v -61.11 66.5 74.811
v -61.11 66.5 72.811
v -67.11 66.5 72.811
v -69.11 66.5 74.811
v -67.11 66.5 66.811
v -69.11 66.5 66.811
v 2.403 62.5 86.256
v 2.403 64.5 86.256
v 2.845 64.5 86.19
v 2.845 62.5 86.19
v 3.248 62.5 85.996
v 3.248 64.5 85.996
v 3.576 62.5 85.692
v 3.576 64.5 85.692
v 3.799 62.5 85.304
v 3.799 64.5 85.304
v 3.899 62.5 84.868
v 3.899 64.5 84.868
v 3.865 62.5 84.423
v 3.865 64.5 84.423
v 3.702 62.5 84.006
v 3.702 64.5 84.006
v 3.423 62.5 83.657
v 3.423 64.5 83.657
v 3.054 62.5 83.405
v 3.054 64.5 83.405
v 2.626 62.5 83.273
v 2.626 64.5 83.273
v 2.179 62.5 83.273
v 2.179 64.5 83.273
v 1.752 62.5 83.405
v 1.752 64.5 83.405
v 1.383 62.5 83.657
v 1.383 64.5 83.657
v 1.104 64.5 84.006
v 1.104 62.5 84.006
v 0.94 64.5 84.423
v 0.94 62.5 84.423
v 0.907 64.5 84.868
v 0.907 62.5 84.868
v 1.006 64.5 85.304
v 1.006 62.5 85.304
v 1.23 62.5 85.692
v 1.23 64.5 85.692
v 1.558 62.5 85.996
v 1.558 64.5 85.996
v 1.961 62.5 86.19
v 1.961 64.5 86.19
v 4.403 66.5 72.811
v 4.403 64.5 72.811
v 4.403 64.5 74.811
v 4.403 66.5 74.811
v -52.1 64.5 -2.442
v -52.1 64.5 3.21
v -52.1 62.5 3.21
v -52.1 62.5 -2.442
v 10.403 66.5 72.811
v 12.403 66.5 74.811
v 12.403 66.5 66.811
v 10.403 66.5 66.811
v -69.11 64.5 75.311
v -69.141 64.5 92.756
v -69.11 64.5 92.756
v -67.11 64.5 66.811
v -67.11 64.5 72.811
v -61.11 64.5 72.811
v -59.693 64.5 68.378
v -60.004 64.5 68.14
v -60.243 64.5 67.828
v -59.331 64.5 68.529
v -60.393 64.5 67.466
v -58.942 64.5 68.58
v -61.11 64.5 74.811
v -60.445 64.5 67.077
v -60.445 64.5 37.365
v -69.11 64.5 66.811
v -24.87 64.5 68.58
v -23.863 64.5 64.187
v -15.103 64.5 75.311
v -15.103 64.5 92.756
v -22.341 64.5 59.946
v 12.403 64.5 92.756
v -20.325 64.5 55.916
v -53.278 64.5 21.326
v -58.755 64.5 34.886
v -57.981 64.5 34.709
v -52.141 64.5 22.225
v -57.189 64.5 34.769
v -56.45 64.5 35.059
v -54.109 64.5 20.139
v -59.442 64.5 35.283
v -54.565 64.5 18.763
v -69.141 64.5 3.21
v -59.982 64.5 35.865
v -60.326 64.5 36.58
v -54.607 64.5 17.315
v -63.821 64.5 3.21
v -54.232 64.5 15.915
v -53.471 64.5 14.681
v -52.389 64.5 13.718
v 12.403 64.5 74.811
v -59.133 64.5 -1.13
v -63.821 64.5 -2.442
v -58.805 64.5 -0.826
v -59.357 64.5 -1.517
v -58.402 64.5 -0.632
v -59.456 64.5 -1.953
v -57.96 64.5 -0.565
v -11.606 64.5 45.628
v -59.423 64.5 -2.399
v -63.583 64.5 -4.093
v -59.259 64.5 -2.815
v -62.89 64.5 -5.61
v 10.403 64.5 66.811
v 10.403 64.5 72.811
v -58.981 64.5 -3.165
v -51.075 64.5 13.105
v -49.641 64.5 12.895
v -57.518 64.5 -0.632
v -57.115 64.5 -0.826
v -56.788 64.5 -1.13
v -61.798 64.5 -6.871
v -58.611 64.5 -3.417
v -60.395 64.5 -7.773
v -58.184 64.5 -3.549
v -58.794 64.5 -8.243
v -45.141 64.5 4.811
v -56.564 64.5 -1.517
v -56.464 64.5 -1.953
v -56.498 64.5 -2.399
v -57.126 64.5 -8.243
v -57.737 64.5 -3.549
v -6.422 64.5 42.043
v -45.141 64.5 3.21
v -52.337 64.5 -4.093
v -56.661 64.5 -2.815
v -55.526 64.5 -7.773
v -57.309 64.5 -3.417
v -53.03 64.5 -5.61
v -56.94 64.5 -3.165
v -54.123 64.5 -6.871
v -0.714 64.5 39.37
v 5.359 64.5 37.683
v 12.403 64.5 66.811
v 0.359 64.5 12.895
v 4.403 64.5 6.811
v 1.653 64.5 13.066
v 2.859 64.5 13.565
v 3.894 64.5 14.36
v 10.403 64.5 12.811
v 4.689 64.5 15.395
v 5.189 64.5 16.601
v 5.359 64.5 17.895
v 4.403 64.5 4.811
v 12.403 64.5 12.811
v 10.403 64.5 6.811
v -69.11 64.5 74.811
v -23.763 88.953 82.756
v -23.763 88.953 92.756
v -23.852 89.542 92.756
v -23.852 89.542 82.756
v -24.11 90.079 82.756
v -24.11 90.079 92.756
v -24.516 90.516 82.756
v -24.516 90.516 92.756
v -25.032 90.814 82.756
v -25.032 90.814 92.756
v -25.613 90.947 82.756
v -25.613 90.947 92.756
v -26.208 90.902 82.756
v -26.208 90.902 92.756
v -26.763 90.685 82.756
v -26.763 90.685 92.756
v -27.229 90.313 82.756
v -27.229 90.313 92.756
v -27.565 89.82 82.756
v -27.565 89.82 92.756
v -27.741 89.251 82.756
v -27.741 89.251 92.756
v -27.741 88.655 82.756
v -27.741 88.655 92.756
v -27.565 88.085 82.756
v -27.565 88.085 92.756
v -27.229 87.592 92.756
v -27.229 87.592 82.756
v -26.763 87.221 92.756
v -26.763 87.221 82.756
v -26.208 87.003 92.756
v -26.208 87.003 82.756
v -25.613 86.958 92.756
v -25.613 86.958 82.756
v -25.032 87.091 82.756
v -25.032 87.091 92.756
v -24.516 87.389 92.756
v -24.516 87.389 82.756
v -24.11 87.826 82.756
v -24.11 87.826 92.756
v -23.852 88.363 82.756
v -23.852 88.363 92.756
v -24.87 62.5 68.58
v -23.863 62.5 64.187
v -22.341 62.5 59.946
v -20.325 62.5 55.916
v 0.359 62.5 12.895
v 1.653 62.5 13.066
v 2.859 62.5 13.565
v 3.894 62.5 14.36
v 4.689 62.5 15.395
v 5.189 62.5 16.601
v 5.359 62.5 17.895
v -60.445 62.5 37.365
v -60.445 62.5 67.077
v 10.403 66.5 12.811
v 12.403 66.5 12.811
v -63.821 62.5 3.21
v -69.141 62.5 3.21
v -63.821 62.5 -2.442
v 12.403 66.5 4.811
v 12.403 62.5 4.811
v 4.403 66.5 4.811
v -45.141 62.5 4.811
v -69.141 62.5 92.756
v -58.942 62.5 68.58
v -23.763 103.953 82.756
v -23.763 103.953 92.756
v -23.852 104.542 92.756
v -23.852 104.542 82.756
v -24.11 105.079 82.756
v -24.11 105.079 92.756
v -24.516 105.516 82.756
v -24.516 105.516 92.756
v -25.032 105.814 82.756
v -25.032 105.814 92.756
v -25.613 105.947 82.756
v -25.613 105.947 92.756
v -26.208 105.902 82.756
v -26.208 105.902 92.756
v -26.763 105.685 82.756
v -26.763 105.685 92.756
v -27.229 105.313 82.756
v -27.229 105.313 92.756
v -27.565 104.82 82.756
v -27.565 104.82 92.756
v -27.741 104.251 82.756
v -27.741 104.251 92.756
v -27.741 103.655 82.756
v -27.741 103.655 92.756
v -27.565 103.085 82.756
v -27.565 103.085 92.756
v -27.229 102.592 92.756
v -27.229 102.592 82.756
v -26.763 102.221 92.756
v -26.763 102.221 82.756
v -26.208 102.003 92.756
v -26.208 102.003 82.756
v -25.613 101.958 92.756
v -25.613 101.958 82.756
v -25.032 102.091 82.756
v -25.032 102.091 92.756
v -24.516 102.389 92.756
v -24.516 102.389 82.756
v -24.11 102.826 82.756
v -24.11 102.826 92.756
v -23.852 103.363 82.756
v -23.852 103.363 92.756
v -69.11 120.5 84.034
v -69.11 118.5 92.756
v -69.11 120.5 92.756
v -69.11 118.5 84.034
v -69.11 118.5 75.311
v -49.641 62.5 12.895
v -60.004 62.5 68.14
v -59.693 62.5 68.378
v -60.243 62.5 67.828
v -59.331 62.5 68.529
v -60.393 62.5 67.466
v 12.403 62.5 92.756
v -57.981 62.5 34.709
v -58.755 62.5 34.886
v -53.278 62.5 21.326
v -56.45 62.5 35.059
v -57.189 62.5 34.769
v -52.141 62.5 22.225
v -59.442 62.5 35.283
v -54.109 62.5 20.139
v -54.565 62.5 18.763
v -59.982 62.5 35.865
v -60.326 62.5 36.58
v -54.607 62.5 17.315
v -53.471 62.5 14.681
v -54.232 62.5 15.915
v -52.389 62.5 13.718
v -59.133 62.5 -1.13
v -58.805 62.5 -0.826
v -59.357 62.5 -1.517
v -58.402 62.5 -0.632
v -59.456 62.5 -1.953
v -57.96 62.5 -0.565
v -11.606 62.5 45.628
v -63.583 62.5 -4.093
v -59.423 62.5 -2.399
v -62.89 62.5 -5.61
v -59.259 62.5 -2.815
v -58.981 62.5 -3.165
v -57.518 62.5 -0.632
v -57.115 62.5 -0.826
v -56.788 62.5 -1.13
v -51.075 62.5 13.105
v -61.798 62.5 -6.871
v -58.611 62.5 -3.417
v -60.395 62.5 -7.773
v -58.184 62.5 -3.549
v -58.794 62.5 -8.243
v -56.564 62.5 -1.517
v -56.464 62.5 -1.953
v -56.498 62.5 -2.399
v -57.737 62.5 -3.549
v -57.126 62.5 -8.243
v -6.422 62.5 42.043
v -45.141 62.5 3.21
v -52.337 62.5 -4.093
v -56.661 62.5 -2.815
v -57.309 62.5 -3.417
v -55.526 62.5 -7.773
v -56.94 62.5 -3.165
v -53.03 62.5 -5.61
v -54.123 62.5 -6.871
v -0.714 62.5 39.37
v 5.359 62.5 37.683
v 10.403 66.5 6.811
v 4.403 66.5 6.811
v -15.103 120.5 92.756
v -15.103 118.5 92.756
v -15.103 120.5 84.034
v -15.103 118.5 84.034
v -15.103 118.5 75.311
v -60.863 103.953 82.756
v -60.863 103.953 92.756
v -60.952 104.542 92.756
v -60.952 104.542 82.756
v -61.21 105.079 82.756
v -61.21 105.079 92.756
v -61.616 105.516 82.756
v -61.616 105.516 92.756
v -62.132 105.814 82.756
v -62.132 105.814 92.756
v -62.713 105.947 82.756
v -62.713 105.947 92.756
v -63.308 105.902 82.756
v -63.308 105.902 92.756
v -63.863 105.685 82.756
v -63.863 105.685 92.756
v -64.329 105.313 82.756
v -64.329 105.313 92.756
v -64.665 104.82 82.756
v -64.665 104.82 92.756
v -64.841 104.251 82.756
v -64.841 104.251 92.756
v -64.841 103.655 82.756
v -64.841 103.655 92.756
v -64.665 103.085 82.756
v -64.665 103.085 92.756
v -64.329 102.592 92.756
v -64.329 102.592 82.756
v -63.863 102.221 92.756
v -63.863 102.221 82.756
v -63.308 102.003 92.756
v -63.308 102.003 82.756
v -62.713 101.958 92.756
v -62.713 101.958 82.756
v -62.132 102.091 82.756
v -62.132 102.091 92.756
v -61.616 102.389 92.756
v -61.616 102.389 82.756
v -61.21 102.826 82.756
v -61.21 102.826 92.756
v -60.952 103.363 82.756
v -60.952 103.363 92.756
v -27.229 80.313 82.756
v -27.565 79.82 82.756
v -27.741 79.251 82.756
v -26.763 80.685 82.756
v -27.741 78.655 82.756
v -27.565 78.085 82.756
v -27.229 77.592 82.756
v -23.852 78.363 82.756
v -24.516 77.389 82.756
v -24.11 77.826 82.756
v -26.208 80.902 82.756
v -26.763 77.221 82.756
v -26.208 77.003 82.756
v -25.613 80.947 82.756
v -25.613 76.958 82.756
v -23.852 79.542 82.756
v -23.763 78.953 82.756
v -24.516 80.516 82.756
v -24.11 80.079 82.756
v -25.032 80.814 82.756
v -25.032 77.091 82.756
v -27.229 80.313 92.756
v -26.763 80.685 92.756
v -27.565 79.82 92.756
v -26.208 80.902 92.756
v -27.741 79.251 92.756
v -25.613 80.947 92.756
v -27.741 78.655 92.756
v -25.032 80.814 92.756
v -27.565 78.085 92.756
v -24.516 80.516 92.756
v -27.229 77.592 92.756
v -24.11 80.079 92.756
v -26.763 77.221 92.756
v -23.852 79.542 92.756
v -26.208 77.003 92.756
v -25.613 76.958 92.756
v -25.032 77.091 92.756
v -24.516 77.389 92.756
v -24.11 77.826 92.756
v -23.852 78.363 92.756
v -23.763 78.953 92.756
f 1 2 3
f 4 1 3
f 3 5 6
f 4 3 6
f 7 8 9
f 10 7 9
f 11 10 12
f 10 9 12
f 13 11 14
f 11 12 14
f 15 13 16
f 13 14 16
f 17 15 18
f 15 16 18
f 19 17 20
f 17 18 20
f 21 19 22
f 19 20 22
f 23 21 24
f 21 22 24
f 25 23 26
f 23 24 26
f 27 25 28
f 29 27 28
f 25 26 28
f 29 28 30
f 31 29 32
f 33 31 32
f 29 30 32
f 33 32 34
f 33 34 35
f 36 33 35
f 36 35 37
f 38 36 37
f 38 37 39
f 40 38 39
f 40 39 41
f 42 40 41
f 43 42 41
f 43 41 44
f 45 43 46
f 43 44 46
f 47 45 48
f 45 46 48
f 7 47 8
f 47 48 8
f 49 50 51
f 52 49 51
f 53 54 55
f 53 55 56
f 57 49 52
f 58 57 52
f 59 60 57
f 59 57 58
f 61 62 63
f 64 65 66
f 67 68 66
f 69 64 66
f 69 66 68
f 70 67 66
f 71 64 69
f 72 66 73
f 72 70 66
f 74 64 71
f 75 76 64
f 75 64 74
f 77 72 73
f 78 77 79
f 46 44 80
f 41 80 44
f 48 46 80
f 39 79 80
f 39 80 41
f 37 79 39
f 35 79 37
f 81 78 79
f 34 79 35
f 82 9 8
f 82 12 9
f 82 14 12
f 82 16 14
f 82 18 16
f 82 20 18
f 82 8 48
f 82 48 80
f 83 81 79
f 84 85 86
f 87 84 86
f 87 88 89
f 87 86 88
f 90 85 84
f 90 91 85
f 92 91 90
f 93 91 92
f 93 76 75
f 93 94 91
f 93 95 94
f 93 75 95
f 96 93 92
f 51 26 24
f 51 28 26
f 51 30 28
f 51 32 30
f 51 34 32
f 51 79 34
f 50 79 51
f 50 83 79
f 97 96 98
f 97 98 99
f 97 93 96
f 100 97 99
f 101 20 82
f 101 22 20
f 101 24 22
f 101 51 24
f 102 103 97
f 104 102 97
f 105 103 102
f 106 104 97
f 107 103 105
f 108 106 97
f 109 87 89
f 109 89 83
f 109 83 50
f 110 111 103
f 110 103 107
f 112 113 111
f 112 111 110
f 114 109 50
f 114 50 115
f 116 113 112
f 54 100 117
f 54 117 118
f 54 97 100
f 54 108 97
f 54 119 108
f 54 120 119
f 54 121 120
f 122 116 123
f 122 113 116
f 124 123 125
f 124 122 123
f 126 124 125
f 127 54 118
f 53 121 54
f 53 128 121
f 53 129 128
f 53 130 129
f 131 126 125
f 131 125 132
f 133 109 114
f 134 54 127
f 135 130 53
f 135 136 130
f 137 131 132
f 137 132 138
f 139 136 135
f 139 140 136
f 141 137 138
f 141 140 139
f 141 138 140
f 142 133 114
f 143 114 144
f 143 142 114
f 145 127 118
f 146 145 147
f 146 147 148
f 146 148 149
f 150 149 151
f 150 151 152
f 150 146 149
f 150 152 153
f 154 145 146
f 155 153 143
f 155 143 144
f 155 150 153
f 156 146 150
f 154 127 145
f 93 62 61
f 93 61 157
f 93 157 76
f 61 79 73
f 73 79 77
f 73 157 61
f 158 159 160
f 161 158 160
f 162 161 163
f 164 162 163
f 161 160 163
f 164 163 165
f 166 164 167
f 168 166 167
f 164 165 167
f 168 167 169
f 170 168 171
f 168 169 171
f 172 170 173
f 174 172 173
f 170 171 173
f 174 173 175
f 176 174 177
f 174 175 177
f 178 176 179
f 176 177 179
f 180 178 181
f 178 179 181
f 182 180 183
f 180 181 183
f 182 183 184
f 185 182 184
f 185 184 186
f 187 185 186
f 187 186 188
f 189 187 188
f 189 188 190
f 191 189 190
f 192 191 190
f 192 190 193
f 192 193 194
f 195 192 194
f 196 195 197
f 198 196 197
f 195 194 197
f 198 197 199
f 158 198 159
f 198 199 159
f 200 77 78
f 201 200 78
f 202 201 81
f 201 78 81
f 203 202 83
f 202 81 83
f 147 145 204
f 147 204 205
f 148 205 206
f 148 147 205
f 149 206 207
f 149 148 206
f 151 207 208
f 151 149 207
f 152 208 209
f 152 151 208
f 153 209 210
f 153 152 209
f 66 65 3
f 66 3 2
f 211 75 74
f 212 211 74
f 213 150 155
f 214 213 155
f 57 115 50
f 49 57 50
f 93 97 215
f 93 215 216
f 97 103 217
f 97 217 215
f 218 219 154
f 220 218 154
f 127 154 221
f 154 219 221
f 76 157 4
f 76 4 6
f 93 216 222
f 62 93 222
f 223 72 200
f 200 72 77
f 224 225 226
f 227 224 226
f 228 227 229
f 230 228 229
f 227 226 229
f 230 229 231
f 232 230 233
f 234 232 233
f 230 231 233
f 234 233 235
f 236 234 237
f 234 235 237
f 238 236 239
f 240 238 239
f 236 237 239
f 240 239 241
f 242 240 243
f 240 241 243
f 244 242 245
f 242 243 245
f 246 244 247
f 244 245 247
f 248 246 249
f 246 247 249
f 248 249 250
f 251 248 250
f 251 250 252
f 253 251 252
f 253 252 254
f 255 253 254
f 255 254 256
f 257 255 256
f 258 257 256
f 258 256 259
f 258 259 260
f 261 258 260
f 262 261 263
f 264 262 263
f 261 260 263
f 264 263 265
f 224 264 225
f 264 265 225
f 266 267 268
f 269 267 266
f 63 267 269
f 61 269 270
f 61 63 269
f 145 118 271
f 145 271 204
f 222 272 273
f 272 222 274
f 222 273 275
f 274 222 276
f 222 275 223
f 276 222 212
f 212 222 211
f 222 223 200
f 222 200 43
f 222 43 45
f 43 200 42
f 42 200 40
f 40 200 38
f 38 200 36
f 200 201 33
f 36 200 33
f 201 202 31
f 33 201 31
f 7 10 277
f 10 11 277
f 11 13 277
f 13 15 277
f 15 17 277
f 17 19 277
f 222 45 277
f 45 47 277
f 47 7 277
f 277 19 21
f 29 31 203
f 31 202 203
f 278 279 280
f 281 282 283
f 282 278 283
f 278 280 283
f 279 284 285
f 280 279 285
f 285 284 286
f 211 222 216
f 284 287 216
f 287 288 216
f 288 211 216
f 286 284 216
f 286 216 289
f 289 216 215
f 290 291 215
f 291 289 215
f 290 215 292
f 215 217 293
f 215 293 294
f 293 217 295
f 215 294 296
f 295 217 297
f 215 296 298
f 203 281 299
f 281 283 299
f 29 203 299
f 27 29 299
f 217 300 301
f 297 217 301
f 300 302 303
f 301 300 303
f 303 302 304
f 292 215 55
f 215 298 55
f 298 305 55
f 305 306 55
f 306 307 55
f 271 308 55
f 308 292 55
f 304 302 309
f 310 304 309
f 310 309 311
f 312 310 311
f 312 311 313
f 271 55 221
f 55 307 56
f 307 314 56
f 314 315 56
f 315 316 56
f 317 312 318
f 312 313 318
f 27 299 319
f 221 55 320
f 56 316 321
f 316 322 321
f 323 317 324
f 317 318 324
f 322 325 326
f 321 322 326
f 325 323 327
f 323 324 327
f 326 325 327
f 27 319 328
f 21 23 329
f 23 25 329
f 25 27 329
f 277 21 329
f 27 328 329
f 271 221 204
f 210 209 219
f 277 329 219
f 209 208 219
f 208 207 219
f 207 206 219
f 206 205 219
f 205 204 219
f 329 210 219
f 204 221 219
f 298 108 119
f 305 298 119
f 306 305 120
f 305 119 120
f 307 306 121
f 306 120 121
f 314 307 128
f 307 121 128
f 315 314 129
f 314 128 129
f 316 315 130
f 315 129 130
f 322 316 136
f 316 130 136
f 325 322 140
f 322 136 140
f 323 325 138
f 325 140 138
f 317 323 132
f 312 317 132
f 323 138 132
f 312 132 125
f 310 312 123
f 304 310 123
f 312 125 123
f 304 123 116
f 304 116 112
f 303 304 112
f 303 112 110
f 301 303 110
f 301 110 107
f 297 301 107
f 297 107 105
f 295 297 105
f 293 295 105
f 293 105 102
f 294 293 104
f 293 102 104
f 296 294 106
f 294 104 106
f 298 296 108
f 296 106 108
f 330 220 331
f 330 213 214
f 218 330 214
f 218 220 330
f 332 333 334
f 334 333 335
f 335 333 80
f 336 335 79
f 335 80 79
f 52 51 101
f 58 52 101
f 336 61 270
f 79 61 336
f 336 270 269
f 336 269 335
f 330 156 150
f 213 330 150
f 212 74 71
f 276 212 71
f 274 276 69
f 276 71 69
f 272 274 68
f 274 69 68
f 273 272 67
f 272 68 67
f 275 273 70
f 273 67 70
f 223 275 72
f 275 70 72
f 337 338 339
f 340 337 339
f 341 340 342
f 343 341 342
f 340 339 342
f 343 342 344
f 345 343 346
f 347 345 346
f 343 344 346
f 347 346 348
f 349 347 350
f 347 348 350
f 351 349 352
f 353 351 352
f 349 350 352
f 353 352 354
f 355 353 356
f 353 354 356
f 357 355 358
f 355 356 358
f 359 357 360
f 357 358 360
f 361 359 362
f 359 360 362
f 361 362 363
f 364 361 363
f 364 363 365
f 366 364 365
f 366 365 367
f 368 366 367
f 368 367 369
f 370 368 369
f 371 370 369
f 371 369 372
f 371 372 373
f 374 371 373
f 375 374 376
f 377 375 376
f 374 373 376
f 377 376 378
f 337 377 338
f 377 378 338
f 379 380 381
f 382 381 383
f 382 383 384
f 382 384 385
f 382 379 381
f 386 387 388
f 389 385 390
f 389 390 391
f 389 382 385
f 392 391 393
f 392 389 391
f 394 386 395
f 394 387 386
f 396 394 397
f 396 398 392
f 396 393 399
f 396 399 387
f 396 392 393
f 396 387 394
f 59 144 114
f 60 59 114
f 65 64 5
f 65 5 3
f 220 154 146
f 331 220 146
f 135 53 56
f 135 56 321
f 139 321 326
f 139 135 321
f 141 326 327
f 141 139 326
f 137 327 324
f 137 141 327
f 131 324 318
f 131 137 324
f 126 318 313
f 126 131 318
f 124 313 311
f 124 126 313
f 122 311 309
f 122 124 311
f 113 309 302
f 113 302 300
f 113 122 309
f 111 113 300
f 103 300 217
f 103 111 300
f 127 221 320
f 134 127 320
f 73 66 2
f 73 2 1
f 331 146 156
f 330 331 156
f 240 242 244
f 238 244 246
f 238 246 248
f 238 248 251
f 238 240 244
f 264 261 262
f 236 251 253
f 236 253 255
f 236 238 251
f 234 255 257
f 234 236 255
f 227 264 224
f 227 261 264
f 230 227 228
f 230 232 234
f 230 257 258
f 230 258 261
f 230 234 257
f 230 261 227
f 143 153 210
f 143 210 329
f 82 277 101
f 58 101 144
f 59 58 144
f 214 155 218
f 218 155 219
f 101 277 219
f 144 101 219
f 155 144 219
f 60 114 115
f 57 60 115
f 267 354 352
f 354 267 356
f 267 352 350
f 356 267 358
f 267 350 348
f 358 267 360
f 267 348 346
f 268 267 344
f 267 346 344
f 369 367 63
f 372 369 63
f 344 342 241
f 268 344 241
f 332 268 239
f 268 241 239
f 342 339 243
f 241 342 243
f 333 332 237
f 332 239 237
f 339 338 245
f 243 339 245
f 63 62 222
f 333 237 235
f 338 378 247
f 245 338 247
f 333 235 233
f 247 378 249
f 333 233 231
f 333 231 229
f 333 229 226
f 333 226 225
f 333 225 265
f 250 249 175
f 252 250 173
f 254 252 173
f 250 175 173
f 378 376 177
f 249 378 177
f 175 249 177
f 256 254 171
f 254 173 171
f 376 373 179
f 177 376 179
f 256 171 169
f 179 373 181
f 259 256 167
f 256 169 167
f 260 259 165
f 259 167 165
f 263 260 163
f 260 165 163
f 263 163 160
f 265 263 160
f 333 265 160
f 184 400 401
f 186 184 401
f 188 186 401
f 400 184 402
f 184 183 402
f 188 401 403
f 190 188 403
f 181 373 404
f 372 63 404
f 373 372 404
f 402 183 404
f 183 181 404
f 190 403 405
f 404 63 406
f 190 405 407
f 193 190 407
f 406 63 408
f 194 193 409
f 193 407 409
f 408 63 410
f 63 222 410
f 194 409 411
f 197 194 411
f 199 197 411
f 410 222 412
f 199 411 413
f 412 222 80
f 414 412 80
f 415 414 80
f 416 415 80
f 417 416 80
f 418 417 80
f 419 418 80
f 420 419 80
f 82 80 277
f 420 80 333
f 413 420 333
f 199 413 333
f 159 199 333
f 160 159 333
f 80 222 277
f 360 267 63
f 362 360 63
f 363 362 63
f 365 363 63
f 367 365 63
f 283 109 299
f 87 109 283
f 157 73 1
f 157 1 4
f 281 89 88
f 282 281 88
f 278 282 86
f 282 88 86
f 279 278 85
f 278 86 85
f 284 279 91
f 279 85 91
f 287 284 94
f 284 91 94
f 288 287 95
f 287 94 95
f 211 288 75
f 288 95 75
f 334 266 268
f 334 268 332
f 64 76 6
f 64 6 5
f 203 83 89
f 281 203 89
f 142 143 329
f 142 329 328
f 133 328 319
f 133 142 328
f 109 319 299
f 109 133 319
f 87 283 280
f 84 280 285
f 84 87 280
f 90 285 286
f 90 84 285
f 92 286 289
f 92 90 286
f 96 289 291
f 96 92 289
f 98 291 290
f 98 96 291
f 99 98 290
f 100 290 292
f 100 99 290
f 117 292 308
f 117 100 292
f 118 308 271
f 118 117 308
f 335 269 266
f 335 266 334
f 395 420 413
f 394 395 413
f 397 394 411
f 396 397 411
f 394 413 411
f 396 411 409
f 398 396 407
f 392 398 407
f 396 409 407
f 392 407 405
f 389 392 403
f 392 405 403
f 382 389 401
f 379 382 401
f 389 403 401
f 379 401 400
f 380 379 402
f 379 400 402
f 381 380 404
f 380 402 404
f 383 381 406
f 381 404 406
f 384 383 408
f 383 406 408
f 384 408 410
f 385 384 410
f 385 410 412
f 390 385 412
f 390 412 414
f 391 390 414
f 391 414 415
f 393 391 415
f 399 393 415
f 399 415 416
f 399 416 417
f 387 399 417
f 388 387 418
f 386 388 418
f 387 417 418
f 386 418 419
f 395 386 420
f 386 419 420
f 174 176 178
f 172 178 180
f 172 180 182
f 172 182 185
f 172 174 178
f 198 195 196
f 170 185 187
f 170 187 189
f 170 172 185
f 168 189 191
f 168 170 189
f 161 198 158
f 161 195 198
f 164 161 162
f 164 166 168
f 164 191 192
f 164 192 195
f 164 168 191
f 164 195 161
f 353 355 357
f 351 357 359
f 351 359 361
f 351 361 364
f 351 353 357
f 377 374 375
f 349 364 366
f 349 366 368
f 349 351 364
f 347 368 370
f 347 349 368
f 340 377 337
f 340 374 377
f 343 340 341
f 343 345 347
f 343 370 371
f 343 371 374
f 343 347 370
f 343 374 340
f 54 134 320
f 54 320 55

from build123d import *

# Parameters (mm, degrees)
EXTRUDE_1_DEPTH     = 2
EXTRUDE_2_DEPTH     = 2
SKETCH_3_W          = 54.00760584
SKETCH_3_H          = 17.445111018
EXTRUDE_4_DEPTH     = 54
SKETCH_4_W          = 54.00760584
SKETCH_4_H          = 8.722555509
EXTRUDE_5_DEPTH     = 2
CUT_EXTRUDE_1_DEPTH = 2
SKETCH_6_R          = 1.5
CUT_EXTRUDE_2_DEPTH = 2
SKETCH_7_R          = 1.5
CUT_EXTRUDE_3_DEPTH = 2
SKETCH_8_R          = 2
CUT_EXTRUDE_4_DEPTH = 10
SKETCH_9_R          = 2
CUT_EXTRUDE_5_DEPTH = 10
CUT_EXTRUDE_6_DEPTH = 10


with BuildPart() as part:
    # 草图1 → 凸台-拉伸1 (new body)
    with BuildSketch(Plane(origin=(0, 62.5, 0), x_dir=(1, 0, 0), z_dir=(0, 1, 0))):
        Polygon((12.40278244, -4.811222629), (-45.141204286, -4.811222629), (-45.141204286, 44.365970357), (-69.141204286, 44.365970357), (-69.141204286, -4.811222629), (-69.141204286, -92.756333647), (12.40278244, -92.756333647), align=None)
    extrude(amount=EXTRUDE_1_DEPTH)

    # 草图2 → 凸台-拉伸2 (add)
    with BuildSketch(Plane(origin=(0, 64.5, 0), x_dir=(1, 0, 0), z_dir=(0, 1, 0))):
        Polygon((12.40278244, -4.811222629), (4.40278244, -4.811222629), (4.40278244, -6.811222629), (10.40278244, -6.811222629), (10.40278244, -12.811222629), (12.40278244, -12.811222629), align=None)
        Polygon((12.40278244, -66.811222629), (10.40278244, -66.811222629), (10.40278244, -72.811222629), (4.40278244, -72.811222629), (4.40278244, -74.811222629), (12.40278244, -74.811222629), align=None)
        Polygon((-69.110275928, -74.811222629), (-69.110275928, -66.811222629), (-67.110275928, -66.811222629), (-67.110275928, -72.811222629), (-61.110275928, -72.811222629), (-61.110275928, -74.811222629), align=None)
    extrude(amount=EXTRUDE_2_DEPTH)

    # 草图3 → 凸台-拉伸4 (add)
    with BuildSketch(Plane(origin=(0, 64.5, 0), x_dir=(1, 0, 0), z_dir=(0, 1, 0))):
        with Locations((-42.106473008, -84.033778138)):
            Rectangle(SKETCH_3_W, SKETCH_3_H)
    extrude(amount=EXTRUDE_4_DEPTH)

    # 草图4 → 凸台-拉伸5 (add)
    with BuildSketch(Plane(origin=(0, 118.5, 0), x_dir=(1, 0, 0), z_dir=(0, 1, 0))):
        with Locations((-42.106473008, -88.395055893)):
            Rectangle(SKETCH_4_W, SKETCH_4_H)
    extrude(amount=EXTRUDE_5_DEPTH)

    # 草图5 → 切除-拉伸1 (cut)
    with BuildSketch(Plane(origin=(0, 64.5, 0), x_dir=(1, 0, 0), z_dir=(0, 1, 0))):
        with BuildLine():
            Line((-69.141204286, 44.365970357), (-45.141204286, 44.365970357))
            Line((-45.141204286, 44.365970357), (-45.141204286, 12.939643007))
            Line((-45.141204286, 12.939643007), (-45.141204286, -3.210429493))
            Line((-45.141204286, -3.210429493), (-52.09989667, -3.210429493))
            Line((-52.09989667, -3.210429493), (-52.09989667, 2.442121652))
            ThreePointArc((-52.09989667, 2.442121652), (-57.960262195, 8.302487177), (-63.820627721, 2.442121652))
            Line((-63.820627721, 2.442121652), (-63.820627721, -3.210429493))
            Line((-63.820627721, -3.210429493), (-69.141204286, -3.210429493))
            Line((-69.141204286, -3.210429493), (-69.141204286, 12.939643007))
            Line((-69.141204286, 12.939643007), (-69.141204286, 44.365970357))
        make_face()
    extrude(amount=-CUT_EXTRUDE_1_DEPTH, mode=Mode.SUBTRACT)

    # 草图6 → 切除-拉伸2 (cut)
    with BuildSketch(Plane(origin=(0, 64.5, 0), x_dir=(1, 0, 0), z_dir=(0, 1, 0))):
        with Locations(Location((-57.960262195, 2.065309301, 0), (0, 0, 270))):
            Circle(SKETCH_6_R)
    extrude(amount=-CUT_EXTRUDE_2_DEPTH, mode=Mode.SUBTRACT)

    # 草图7 → 切除-拉伸3 (cut)
    with BuildSketch(Plane(origin=(0, 64.5, 0), x_dir=(1, 0, 0), z_dir=(0, 1, 0))):
        with Locations(Location((2.40278244, -84.756333647, 0), (0, 0, 270))):
            Circle(SKETCH_7_R)
    extrude(amount=-CUT_EXTRUDE_3_DEPTH, mode=Mode.SUBTRACT)

    # 草图8 → 切除-拉伸4 (cut)
    with BuildSketch(Plane.XY.offset(92.756333647)):
        with Locations((-62.862887917, 103.952611989)):
            Circle(SKETCH_8_R)
        with Locations((-25.762887917, 103.952611989)):
            Circle(SKETCH_8_R)
    extrude(amount=-CUT_EXTRUDE_4_DEPTH, mode=Mode.SUBTRACT)

    # 草图9 → 切除-拉伸5 (cut)
    with BuildSketch(Plane.XY.offset(92.756333647)):
        with Locations((-25.762887917, 78.952611989)):
            Circle(SKETCH_9_R)
        with Locations((-25.762887917, 88.952611989)):
            Circle(SKETCH_9_R)
    extrude(amount=-CUT_EXTRUDE_5_DEPTH, mode=Mode.SUBTRACT)

    # 草图10 → 切除-拉伸6 (cut)
    with BuildSketch(Plane(origin=(0, 64.5, 0), x_dir=(1, 0, 0), z_dir=(0, 1, 0))):
        with BuildLine():
            Line((-49.641043763, -12.895188862), (0.358956237, -12.895188862))
            ThreePointArc((0.358956237, -12.895188862), (3.894490143, -14.359654957), (5.358956237, -17.895188862))
            Line((5.358956237, -17.895188862), (5.358956237, -37.683198524))
            ThreePointArc((5.358956237, -37.683198524), (-3.623853253, -40.587654582), (-11.606455481, -45.627971337))
            Line((-11.606455481, -45.627971337), (-52.141043763, -22.225315881))
            ThreePointArc((-52.141043763, -22.225315881), (-54.470672894, -16.601093637), (-49.641043763, -12.895188862))
        make_face()
        with BuildLine():
            Line((-20.324564628, -55.916079989), (-56.450495194, -35.058764253))
            ThreePointArc((-56.450495194, -35.058764253), (-59.11319003, -35.058764253), (-60.444537448, -37.364725623))
            Line((-60.444537448, -37.364725623), (-60.444537448, -67.07683336))
            ThreePointArc((-60.444537448, -67.07683336), (-60.004346188, -68.139549071), (-58.941630477, -68.579740332))
            Line((-58.941630477, -68.579740332), (-24.870187523, -68.579740332))
            ThreePointArc((-24.870187523, -68.579740332), (-23.165506378, -62.043979698), (-20.324564628, -55.916079989))
        make_face()
    extrude(amount=-CUT_EXTRUDE_6_DEPTH, mode=Mode.SUBTRACT)


solid = part.part
